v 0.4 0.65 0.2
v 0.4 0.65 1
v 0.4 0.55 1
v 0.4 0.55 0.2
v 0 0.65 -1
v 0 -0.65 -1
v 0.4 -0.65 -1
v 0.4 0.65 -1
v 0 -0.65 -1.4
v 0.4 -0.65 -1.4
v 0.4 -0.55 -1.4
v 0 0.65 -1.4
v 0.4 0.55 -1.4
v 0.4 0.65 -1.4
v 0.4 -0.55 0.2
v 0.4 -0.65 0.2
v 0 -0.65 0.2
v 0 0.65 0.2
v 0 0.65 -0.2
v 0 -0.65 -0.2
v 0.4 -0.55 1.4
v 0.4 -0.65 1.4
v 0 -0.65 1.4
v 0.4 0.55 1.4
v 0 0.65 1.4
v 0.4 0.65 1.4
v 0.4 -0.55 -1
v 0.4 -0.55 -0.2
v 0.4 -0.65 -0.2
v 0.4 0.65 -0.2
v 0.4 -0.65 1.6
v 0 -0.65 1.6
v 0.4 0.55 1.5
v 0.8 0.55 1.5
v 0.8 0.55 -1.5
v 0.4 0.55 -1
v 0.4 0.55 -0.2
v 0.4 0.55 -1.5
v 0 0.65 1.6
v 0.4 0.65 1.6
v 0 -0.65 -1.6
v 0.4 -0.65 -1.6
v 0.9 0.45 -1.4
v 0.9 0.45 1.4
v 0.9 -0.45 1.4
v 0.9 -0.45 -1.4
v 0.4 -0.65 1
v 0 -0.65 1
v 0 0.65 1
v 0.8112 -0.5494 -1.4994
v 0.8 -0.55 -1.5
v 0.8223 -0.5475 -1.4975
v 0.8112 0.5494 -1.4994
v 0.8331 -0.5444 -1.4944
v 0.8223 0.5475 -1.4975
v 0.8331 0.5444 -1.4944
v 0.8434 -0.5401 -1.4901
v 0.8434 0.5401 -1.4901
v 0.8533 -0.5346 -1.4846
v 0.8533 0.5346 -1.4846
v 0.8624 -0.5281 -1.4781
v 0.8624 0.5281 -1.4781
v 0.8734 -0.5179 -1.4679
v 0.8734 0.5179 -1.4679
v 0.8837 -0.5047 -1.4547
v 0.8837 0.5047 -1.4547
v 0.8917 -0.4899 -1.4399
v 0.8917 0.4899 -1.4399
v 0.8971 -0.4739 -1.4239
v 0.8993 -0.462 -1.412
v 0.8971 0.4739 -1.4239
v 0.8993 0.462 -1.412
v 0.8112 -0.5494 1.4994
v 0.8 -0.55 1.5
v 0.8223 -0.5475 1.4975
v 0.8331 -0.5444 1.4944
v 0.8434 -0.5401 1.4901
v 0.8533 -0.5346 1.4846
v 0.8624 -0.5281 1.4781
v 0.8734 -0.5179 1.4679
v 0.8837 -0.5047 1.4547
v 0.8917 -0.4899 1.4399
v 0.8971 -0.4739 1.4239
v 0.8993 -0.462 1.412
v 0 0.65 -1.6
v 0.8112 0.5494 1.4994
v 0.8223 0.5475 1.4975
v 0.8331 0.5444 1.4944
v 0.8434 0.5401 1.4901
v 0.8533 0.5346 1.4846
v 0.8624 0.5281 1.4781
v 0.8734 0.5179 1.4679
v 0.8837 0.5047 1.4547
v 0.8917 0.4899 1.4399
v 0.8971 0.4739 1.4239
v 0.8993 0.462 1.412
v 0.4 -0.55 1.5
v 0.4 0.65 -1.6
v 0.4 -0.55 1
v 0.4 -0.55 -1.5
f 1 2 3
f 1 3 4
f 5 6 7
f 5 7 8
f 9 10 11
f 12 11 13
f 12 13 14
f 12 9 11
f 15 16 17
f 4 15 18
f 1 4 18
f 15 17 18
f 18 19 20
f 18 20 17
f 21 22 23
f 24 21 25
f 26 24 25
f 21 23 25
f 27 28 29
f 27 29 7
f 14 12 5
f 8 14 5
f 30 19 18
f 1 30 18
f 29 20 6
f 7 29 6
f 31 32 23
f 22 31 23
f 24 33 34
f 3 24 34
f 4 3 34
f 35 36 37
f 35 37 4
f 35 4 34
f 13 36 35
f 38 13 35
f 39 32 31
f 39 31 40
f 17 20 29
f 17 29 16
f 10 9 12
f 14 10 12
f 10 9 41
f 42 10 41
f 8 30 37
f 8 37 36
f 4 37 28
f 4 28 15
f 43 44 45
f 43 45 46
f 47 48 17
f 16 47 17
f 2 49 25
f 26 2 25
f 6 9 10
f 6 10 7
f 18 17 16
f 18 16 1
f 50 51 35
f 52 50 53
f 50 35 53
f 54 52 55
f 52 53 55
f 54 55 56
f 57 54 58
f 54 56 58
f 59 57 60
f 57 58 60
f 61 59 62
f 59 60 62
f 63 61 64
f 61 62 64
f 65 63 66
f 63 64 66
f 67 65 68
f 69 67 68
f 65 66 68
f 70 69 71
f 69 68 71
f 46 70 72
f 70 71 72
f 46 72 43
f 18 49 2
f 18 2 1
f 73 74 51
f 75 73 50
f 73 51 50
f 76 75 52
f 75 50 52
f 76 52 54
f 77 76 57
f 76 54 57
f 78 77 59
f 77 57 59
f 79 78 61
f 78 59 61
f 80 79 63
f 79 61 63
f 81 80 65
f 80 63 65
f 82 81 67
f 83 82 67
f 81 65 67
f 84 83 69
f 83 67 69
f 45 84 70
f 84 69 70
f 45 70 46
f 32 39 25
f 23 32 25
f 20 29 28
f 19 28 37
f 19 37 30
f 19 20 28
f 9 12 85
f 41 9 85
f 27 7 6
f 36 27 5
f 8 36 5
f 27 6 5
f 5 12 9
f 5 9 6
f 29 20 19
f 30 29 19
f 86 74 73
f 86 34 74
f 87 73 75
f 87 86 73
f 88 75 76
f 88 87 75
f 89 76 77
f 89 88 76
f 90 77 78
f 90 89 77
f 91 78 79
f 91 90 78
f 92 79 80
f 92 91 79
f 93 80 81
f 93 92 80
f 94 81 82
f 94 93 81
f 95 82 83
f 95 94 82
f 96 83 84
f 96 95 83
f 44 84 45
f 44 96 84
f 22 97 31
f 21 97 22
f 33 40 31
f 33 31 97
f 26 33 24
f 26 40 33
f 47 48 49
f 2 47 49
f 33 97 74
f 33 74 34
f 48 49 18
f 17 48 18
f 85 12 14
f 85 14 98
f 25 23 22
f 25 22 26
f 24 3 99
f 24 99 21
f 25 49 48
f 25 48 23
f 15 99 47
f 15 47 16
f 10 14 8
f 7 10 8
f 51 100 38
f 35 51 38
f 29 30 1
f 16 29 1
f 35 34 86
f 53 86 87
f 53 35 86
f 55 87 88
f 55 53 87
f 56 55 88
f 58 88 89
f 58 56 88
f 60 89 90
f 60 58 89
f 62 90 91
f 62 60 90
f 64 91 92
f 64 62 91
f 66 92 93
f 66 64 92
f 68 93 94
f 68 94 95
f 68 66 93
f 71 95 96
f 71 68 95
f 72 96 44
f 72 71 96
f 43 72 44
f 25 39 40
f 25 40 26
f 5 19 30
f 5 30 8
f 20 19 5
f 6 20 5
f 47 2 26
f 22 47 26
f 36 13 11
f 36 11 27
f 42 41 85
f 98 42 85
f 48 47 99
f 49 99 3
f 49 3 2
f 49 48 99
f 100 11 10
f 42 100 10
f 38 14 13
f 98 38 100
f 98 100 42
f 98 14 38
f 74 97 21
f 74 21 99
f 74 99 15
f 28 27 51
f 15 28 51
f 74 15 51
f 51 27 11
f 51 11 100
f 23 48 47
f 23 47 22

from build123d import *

# Parameters (mm, degrees)
SKETCH1_W             = 3.2
SKETCH1_H             = 1.3
BOSS_EXTRUDE1_DEPTH   = 0.4
SKETCH2_W             = 3
SKETCH2_H             = 1.1
BOSS_EXTRUDE2_DEPTH   = 0.5
SKETCH3_W             = 0.4
SKETCH3_H             = 1.3
CUT_EXTRUDE1_DEPTH    = 0.4
SKETCH3_2_W           = 0.4
SKETCH3_2_H           = 1.3
BOSS_EXTRUDE3_DEPTH   = 0.4
BOSS_EXTRUDE3_2_DEPTH = 0.4
BOSS_EXTRUDE3_3_DEPTH = 0.4
FILLET1_R             = 0.1


with BuildPart() as part:
    # Sketch1 → Boss-Extrude1 (new body)
    with BuildSketch(Plane(origin=(0, 0, 0), x_dir=(0, 0, -1), z_dir=(1, 0, 0))):
        Rectangle(SKETCH1_W, SKETCH1_H)
    extrude(amount=BOSS_EXTRUDE1_DEPTH)

    # Sketch2 → Boss-Extrude2 (add)
    with BuildSketch(Plane(origin=(0.4, 0, 0), x_dir=(0, 0, -1), z_dir=(1, 0, 0))):
        Rectangle(SKETCH2_W, SKETCH2_H)
    extrude(amount=BOSS_EXTRUDE2_DEPTH)

    # Sketch3 → Cut-Extrude1 (cut)
    with BuildSketch(Plane.ZY):
        with Locations((1.2, 0)):
            Rectangle(SKETCH3_W, SKETCH3_H)
        Rectangle(SKETCH3_W, SKETCH3_H)
        with Locations((-1.2, 0)):
            Rectangle(SKETCH3_W, SKETCH3_H)
    extrude(amount=-CUT_EXTRUDE1_DEPTH, mode=Mode.SUBTRACT)

    # Fillet1
    fillet1_edges = [part.edges().sort_by_distance(p)[0] for p in [
        (0.9, 0, -1.5),
        (0.9, 0.55, 0),
        (0.9, 0, 1.5),
        (0.9, -0.55, 0),
    ]]
    fillet(fillet1_edges, radius=FILLET1_R)


with BuildPart() as body_2:
    # Sketch3<2> → Boss-Extrude3 (new body)
    with BuildSketch(Plane.ZY):
        with Locations((1.2, 0)):
            Rectangle(SKETCH3_2_W, SKETCH3_2_H)
    extrude(amount=-BOSS_EXTRUDE3_DEPTH)


with BuildPart() as body_3:
    # Sketch3<2> → Boss-Extrude3 2 (new body)
    with BuildSketch(Plane.ZY):
        Rectangle(SKETCH3_2_W, SKETCH3_2_H)
    extrude(amount=-BOSS_EXTRUDE3_2_DEPTH)


with BuildPart() as body_4:
    # Sketch3<2> → Boss-Extrude3 3 (new body)
    with BuildSketch(Plane.ZY):
        with Locations((-1.2, 0)):
            Rectangle(SKETCH3_2_W, SKETCH3_2_H)
    extrude(amount=-BOSS_EXTRUDE3_3_DEPTH)


solid = Compound([part.part, body_2.part, body_3.part, body_4.part])
